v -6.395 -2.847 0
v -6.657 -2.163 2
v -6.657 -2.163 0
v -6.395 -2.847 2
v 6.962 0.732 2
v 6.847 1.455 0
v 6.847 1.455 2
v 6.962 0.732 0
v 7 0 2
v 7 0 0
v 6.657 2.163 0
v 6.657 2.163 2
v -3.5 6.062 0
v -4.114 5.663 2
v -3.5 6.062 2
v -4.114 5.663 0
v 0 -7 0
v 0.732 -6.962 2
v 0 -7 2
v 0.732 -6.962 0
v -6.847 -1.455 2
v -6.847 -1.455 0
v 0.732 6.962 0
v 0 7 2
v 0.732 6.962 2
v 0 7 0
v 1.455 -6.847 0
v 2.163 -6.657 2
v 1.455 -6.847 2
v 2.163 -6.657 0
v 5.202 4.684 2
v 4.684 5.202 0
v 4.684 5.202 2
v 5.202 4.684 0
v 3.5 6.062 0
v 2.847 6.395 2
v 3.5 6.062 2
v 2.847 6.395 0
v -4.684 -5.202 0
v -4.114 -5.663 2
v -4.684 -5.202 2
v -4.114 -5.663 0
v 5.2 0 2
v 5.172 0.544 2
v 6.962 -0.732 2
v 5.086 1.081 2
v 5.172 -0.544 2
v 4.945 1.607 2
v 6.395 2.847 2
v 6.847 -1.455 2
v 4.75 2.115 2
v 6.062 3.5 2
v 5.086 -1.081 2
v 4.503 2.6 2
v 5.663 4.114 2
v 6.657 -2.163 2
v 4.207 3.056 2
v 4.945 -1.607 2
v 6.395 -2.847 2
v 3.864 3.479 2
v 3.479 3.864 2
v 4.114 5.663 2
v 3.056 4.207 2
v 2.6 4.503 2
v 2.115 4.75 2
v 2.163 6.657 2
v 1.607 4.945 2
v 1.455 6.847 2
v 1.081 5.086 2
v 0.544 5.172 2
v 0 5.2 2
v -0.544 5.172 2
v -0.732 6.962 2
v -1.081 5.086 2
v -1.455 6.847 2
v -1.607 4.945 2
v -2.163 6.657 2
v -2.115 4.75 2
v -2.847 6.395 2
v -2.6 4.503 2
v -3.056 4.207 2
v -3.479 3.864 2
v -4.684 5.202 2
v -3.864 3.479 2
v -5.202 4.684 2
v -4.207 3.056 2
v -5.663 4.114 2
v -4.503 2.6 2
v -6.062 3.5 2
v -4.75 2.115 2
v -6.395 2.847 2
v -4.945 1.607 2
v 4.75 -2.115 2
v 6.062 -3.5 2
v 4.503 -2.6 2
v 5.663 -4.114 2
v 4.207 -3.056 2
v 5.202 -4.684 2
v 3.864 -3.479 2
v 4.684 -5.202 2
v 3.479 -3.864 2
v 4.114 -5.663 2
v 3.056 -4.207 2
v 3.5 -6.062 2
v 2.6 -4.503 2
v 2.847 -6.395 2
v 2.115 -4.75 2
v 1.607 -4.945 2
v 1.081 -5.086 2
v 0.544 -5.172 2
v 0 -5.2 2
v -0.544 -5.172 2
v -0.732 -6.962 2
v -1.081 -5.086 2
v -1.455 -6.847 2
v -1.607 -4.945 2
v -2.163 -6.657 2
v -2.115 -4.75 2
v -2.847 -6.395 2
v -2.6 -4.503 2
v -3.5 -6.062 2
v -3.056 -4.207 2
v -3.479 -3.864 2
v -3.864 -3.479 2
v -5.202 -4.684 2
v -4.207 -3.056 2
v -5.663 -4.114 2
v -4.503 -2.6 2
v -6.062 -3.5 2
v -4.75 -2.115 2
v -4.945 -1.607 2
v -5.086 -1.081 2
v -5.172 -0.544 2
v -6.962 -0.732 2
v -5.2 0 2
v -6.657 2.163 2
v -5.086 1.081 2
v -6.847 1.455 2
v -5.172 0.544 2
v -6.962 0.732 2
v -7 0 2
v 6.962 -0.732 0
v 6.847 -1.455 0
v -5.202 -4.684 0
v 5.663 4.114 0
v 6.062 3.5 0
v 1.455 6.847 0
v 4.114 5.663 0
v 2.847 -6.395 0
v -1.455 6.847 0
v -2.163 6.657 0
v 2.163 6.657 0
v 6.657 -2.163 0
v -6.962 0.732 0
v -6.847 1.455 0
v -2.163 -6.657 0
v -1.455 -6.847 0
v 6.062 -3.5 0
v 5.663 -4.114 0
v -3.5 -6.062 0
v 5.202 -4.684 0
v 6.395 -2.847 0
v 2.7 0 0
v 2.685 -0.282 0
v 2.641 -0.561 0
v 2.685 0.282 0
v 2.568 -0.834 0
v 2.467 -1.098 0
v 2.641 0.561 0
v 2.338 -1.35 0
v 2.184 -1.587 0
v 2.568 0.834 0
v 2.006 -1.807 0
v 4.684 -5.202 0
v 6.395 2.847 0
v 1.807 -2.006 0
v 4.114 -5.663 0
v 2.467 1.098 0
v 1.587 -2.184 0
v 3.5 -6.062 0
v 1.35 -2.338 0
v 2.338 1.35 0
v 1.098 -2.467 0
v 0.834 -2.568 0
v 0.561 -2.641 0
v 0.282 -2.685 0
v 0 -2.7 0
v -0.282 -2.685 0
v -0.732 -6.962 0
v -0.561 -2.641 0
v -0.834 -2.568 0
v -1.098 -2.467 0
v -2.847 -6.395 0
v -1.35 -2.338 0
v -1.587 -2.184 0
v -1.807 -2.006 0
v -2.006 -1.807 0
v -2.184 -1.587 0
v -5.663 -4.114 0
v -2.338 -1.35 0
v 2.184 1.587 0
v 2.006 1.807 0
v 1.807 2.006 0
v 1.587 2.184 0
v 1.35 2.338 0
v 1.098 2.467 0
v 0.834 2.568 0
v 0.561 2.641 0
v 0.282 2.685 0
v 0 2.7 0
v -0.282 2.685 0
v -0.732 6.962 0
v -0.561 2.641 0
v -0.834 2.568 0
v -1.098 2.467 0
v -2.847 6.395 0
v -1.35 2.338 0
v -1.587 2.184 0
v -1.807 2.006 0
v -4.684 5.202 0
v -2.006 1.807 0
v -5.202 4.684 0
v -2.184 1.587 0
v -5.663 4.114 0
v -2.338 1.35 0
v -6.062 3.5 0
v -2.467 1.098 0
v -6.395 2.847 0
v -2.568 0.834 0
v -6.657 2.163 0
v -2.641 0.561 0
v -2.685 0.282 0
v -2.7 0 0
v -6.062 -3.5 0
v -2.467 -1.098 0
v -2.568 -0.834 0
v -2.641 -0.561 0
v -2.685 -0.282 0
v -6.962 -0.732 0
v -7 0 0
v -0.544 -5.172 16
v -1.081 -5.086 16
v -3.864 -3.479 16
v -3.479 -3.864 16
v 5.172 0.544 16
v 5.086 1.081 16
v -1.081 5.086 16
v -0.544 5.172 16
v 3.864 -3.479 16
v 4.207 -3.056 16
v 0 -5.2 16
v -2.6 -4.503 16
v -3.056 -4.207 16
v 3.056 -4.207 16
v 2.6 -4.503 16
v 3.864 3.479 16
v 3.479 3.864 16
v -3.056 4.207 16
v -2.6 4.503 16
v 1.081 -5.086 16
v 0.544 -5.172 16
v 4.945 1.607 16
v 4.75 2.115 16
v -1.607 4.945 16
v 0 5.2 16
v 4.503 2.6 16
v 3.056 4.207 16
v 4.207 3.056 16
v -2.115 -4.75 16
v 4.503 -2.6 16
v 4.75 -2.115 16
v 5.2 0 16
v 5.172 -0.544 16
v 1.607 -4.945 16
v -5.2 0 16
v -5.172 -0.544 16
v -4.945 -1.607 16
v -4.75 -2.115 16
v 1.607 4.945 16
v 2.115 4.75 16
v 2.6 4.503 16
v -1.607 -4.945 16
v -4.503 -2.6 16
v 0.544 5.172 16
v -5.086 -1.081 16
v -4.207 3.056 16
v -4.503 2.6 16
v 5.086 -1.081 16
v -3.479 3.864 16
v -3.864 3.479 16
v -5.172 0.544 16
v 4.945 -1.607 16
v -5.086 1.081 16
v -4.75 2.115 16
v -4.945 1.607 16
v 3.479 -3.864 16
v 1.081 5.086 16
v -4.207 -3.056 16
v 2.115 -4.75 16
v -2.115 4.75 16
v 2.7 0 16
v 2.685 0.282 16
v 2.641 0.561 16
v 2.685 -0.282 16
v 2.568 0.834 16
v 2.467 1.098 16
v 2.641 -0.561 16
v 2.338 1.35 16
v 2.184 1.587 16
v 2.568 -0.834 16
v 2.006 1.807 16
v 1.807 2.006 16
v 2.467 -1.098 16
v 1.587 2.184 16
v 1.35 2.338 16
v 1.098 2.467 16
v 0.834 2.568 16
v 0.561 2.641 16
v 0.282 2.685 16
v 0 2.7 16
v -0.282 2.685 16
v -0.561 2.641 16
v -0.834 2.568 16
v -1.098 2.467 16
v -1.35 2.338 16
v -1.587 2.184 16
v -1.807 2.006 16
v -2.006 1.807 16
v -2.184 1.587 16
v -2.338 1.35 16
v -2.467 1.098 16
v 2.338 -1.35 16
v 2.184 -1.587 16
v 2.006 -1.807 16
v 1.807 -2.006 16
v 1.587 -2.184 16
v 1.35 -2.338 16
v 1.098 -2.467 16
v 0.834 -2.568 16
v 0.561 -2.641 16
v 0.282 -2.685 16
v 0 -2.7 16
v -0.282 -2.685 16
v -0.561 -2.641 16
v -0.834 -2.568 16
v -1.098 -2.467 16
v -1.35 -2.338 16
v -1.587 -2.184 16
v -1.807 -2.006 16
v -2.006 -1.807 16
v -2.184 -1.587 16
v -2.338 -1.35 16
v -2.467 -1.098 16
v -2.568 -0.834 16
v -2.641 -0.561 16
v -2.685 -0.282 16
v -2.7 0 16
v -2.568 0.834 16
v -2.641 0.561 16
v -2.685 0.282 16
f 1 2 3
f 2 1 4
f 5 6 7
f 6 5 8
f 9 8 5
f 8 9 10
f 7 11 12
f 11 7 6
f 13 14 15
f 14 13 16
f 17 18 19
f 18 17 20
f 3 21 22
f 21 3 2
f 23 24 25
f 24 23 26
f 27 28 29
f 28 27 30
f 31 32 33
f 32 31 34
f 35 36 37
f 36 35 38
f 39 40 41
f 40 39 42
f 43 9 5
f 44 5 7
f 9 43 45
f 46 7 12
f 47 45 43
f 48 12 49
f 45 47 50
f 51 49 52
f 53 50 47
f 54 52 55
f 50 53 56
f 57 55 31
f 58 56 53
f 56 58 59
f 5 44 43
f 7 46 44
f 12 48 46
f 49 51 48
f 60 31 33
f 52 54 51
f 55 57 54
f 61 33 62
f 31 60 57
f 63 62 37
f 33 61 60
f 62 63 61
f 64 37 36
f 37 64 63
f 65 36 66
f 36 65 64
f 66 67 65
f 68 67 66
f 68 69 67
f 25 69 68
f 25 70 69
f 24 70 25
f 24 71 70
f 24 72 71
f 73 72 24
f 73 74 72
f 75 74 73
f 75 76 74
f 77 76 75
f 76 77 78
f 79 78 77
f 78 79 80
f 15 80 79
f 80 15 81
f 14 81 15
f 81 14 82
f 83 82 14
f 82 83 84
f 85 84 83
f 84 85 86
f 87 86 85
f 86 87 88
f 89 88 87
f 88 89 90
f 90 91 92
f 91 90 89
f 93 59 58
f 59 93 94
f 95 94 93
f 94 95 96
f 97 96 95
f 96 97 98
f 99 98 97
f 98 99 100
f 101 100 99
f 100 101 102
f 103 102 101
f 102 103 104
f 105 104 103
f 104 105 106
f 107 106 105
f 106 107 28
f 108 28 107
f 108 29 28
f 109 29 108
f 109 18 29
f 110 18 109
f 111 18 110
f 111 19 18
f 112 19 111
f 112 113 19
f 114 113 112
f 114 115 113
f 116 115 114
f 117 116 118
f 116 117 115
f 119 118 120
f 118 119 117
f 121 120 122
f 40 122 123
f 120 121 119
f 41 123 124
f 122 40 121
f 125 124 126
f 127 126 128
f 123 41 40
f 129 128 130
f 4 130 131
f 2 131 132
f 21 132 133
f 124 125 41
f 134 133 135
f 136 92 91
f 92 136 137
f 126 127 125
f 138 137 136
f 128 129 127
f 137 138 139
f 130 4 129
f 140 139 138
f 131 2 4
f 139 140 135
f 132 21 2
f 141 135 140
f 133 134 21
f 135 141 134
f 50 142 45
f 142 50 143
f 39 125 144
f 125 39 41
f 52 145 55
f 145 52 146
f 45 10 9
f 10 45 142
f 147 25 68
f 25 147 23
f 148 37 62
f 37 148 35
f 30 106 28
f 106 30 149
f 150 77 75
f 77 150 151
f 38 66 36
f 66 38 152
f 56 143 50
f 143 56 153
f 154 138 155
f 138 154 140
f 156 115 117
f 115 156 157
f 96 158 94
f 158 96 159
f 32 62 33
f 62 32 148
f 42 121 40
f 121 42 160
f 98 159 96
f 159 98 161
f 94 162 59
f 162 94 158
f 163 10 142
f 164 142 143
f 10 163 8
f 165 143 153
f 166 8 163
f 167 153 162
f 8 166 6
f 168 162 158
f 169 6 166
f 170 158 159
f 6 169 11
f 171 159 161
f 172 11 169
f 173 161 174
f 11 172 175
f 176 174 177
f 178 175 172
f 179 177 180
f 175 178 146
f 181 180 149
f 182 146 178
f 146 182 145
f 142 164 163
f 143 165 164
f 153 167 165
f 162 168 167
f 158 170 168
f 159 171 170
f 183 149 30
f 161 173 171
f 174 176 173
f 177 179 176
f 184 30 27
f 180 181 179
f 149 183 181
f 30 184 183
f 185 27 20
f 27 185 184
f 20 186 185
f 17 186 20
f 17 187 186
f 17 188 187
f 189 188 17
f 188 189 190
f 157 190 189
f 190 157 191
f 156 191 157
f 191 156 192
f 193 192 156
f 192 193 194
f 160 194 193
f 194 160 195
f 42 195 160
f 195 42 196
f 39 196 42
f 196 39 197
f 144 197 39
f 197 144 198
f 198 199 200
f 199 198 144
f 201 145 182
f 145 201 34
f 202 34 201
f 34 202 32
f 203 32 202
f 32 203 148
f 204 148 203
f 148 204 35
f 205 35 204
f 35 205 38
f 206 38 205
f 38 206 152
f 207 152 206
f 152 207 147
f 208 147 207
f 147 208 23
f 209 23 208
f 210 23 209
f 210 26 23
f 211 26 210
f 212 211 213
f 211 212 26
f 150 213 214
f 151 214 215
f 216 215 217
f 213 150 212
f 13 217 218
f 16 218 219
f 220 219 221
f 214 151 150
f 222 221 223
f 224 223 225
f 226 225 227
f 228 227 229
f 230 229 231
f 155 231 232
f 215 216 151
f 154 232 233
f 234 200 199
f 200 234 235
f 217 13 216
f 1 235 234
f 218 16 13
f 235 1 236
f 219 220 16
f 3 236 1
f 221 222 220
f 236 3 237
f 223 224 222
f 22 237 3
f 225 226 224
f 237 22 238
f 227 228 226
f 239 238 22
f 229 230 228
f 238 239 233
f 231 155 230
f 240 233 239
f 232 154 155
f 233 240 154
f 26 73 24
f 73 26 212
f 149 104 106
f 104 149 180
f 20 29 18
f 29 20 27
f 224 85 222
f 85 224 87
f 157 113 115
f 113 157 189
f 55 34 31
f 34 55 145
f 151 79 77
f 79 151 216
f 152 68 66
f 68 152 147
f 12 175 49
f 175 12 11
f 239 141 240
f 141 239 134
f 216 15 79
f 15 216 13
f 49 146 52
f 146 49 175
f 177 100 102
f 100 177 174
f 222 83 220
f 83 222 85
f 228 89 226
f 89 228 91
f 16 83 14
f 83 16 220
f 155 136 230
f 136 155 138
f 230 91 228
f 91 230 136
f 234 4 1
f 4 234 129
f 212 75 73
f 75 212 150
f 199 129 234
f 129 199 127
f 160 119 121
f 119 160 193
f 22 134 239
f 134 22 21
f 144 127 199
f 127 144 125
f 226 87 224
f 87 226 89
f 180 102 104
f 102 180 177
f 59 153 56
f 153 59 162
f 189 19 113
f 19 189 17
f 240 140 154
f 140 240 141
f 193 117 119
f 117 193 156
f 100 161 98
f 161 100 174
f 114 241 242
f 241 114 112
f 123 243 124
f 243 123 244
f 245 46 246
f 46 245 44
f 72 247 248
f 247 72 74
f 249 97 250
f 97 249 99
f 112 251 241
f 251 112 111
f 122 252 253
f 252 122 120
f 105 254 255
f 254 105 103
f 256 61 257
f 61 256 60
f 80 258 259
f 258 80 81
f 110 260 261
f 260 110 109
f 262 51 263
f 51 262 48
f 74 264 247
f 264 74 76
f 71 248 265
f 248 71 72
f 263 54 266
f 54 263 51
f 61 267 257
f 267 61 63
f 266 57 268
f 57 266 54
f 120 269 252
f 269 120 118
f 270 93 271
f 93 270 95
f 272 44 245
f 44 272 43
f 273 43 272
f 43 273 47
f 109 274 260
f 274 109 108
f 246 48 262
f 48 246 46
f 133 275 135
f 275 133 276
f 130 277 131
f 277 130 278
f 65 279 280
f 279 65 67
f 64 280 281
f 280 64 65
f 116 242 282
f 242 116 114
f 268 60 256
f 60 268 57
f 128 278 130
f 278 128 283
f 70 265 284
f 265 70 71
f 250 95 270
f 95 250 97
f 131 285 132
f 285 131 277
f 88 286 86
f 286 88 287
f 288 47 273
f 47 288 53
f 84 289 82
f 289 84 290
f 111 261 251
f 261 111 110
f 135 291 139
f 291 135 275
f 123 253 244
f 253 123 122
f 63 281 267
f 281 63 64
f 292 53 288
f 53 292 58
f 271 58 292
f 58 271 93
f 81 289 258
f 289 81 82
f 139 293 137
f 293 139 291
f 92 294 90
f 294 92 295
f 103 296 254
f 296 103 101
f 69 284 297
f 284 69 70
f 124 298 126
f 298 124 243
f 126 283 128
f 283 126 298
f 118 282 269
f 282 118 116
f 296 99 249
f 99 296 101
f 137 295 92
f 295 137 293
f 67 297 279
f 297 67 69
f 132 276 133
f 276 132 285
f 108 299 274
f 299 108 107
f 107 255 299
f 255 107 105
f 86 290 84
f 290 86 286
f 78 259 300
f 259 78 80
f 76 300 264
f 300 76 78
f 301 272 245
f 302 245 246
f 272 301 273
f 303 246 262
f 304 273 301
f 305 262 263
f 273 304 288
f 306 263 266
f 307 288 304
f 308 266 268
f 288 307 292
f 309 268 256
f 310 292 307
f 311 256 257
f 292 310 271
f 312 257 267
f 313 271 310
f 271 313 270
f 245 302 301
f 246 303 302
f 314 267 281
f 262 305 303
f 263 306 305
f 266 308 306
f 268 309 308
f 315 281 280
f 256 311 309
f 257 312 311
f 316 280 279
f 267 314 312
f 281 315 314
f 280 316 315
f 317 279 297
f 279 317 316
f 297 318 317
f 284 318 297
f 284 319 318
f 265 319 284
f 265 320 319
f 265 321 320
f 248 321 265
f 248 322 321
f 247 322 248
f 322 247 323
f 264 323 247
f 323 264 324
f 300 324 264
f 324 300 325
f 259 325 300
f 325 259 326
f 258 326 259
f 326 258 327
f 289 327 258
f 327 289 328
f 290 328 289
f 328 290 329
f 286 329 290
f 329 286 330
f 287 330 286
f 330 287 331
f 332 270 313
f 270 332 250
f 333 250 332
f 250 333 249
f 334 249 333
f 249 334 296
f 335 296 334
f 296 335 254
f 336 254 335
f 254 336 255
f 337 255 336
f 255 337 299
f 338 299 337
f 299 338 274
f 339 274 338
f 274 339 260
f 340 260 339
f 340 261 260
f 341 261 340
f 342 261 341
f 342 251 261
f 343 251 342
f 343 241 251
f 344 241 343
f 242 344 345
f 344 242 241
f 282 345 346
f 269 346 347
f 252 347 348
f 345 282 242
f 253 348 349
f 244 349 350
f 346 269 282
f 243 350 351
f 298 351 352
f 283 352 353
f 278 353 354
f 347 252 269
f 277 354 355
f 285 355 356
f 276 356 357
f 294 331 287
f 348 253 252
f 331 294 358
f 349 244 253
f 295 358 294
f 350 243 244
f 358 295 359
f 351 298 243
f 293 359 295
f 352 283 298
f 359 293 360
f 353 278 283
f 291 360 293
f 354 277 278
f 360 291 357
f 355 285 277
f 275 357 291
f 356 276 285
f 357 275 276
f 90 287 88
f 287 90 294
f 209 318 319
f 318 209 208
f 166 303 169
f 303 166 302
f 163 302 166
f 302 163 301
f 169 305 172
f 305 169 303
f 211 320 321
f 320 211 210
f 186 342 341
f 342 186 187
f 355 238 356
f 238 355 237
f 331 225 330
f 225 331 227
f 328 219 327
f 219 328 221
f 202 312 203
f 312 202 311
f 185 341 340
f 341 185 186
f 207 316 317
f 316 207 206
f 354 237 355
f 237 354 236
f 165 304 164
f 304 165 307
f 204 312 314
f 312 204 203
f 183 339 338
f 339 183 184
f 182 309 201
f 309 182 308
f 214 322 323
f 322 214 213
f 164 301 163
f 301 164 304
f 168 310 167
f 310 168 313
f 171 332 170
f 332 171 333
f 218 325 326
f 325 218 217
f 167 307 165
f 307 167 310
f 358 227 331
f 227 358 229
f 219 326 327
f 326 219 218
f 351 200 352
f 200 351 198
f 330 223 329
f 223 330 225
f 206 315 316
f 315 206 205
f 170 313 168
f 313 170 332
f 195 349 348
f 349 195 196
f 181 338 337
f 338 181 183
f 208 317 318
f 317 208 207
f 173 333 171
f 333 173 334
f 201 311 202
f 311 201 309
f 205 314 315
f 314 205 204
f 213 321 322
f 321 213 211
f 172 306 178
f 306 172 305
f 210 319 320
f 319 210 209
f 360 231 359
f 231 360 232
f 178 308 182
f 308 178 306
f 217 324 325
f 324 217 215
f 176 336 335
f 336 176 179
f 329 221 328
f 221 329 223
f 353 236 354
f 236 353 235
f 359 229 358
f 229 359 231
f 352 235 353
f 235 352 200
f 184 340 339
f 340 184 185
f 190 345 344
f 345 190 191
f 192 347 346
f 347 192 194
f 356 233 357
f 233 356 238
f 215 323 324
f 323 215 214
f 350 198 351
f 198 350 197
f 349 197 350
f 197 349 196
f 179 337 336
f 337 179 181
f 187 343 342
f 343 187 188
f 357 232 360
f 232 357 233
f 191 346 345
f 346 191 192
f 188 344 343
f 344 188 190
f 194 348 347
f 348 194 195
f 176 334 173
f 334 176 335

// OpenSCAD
// PCB standoff with mounting base.
$fn = 60;
eps = 0.02;
thread_d = 5.4;
base_d = 14;
height = 16;
body_d = thread_d+5;
difference() {
    union() { cylinder(d=base_d,h=2); cylinder(d=body_d,h=height); }
    translate([0,0,-eps]) cylinder(d=thread_d,h=height+2*eps);
}
